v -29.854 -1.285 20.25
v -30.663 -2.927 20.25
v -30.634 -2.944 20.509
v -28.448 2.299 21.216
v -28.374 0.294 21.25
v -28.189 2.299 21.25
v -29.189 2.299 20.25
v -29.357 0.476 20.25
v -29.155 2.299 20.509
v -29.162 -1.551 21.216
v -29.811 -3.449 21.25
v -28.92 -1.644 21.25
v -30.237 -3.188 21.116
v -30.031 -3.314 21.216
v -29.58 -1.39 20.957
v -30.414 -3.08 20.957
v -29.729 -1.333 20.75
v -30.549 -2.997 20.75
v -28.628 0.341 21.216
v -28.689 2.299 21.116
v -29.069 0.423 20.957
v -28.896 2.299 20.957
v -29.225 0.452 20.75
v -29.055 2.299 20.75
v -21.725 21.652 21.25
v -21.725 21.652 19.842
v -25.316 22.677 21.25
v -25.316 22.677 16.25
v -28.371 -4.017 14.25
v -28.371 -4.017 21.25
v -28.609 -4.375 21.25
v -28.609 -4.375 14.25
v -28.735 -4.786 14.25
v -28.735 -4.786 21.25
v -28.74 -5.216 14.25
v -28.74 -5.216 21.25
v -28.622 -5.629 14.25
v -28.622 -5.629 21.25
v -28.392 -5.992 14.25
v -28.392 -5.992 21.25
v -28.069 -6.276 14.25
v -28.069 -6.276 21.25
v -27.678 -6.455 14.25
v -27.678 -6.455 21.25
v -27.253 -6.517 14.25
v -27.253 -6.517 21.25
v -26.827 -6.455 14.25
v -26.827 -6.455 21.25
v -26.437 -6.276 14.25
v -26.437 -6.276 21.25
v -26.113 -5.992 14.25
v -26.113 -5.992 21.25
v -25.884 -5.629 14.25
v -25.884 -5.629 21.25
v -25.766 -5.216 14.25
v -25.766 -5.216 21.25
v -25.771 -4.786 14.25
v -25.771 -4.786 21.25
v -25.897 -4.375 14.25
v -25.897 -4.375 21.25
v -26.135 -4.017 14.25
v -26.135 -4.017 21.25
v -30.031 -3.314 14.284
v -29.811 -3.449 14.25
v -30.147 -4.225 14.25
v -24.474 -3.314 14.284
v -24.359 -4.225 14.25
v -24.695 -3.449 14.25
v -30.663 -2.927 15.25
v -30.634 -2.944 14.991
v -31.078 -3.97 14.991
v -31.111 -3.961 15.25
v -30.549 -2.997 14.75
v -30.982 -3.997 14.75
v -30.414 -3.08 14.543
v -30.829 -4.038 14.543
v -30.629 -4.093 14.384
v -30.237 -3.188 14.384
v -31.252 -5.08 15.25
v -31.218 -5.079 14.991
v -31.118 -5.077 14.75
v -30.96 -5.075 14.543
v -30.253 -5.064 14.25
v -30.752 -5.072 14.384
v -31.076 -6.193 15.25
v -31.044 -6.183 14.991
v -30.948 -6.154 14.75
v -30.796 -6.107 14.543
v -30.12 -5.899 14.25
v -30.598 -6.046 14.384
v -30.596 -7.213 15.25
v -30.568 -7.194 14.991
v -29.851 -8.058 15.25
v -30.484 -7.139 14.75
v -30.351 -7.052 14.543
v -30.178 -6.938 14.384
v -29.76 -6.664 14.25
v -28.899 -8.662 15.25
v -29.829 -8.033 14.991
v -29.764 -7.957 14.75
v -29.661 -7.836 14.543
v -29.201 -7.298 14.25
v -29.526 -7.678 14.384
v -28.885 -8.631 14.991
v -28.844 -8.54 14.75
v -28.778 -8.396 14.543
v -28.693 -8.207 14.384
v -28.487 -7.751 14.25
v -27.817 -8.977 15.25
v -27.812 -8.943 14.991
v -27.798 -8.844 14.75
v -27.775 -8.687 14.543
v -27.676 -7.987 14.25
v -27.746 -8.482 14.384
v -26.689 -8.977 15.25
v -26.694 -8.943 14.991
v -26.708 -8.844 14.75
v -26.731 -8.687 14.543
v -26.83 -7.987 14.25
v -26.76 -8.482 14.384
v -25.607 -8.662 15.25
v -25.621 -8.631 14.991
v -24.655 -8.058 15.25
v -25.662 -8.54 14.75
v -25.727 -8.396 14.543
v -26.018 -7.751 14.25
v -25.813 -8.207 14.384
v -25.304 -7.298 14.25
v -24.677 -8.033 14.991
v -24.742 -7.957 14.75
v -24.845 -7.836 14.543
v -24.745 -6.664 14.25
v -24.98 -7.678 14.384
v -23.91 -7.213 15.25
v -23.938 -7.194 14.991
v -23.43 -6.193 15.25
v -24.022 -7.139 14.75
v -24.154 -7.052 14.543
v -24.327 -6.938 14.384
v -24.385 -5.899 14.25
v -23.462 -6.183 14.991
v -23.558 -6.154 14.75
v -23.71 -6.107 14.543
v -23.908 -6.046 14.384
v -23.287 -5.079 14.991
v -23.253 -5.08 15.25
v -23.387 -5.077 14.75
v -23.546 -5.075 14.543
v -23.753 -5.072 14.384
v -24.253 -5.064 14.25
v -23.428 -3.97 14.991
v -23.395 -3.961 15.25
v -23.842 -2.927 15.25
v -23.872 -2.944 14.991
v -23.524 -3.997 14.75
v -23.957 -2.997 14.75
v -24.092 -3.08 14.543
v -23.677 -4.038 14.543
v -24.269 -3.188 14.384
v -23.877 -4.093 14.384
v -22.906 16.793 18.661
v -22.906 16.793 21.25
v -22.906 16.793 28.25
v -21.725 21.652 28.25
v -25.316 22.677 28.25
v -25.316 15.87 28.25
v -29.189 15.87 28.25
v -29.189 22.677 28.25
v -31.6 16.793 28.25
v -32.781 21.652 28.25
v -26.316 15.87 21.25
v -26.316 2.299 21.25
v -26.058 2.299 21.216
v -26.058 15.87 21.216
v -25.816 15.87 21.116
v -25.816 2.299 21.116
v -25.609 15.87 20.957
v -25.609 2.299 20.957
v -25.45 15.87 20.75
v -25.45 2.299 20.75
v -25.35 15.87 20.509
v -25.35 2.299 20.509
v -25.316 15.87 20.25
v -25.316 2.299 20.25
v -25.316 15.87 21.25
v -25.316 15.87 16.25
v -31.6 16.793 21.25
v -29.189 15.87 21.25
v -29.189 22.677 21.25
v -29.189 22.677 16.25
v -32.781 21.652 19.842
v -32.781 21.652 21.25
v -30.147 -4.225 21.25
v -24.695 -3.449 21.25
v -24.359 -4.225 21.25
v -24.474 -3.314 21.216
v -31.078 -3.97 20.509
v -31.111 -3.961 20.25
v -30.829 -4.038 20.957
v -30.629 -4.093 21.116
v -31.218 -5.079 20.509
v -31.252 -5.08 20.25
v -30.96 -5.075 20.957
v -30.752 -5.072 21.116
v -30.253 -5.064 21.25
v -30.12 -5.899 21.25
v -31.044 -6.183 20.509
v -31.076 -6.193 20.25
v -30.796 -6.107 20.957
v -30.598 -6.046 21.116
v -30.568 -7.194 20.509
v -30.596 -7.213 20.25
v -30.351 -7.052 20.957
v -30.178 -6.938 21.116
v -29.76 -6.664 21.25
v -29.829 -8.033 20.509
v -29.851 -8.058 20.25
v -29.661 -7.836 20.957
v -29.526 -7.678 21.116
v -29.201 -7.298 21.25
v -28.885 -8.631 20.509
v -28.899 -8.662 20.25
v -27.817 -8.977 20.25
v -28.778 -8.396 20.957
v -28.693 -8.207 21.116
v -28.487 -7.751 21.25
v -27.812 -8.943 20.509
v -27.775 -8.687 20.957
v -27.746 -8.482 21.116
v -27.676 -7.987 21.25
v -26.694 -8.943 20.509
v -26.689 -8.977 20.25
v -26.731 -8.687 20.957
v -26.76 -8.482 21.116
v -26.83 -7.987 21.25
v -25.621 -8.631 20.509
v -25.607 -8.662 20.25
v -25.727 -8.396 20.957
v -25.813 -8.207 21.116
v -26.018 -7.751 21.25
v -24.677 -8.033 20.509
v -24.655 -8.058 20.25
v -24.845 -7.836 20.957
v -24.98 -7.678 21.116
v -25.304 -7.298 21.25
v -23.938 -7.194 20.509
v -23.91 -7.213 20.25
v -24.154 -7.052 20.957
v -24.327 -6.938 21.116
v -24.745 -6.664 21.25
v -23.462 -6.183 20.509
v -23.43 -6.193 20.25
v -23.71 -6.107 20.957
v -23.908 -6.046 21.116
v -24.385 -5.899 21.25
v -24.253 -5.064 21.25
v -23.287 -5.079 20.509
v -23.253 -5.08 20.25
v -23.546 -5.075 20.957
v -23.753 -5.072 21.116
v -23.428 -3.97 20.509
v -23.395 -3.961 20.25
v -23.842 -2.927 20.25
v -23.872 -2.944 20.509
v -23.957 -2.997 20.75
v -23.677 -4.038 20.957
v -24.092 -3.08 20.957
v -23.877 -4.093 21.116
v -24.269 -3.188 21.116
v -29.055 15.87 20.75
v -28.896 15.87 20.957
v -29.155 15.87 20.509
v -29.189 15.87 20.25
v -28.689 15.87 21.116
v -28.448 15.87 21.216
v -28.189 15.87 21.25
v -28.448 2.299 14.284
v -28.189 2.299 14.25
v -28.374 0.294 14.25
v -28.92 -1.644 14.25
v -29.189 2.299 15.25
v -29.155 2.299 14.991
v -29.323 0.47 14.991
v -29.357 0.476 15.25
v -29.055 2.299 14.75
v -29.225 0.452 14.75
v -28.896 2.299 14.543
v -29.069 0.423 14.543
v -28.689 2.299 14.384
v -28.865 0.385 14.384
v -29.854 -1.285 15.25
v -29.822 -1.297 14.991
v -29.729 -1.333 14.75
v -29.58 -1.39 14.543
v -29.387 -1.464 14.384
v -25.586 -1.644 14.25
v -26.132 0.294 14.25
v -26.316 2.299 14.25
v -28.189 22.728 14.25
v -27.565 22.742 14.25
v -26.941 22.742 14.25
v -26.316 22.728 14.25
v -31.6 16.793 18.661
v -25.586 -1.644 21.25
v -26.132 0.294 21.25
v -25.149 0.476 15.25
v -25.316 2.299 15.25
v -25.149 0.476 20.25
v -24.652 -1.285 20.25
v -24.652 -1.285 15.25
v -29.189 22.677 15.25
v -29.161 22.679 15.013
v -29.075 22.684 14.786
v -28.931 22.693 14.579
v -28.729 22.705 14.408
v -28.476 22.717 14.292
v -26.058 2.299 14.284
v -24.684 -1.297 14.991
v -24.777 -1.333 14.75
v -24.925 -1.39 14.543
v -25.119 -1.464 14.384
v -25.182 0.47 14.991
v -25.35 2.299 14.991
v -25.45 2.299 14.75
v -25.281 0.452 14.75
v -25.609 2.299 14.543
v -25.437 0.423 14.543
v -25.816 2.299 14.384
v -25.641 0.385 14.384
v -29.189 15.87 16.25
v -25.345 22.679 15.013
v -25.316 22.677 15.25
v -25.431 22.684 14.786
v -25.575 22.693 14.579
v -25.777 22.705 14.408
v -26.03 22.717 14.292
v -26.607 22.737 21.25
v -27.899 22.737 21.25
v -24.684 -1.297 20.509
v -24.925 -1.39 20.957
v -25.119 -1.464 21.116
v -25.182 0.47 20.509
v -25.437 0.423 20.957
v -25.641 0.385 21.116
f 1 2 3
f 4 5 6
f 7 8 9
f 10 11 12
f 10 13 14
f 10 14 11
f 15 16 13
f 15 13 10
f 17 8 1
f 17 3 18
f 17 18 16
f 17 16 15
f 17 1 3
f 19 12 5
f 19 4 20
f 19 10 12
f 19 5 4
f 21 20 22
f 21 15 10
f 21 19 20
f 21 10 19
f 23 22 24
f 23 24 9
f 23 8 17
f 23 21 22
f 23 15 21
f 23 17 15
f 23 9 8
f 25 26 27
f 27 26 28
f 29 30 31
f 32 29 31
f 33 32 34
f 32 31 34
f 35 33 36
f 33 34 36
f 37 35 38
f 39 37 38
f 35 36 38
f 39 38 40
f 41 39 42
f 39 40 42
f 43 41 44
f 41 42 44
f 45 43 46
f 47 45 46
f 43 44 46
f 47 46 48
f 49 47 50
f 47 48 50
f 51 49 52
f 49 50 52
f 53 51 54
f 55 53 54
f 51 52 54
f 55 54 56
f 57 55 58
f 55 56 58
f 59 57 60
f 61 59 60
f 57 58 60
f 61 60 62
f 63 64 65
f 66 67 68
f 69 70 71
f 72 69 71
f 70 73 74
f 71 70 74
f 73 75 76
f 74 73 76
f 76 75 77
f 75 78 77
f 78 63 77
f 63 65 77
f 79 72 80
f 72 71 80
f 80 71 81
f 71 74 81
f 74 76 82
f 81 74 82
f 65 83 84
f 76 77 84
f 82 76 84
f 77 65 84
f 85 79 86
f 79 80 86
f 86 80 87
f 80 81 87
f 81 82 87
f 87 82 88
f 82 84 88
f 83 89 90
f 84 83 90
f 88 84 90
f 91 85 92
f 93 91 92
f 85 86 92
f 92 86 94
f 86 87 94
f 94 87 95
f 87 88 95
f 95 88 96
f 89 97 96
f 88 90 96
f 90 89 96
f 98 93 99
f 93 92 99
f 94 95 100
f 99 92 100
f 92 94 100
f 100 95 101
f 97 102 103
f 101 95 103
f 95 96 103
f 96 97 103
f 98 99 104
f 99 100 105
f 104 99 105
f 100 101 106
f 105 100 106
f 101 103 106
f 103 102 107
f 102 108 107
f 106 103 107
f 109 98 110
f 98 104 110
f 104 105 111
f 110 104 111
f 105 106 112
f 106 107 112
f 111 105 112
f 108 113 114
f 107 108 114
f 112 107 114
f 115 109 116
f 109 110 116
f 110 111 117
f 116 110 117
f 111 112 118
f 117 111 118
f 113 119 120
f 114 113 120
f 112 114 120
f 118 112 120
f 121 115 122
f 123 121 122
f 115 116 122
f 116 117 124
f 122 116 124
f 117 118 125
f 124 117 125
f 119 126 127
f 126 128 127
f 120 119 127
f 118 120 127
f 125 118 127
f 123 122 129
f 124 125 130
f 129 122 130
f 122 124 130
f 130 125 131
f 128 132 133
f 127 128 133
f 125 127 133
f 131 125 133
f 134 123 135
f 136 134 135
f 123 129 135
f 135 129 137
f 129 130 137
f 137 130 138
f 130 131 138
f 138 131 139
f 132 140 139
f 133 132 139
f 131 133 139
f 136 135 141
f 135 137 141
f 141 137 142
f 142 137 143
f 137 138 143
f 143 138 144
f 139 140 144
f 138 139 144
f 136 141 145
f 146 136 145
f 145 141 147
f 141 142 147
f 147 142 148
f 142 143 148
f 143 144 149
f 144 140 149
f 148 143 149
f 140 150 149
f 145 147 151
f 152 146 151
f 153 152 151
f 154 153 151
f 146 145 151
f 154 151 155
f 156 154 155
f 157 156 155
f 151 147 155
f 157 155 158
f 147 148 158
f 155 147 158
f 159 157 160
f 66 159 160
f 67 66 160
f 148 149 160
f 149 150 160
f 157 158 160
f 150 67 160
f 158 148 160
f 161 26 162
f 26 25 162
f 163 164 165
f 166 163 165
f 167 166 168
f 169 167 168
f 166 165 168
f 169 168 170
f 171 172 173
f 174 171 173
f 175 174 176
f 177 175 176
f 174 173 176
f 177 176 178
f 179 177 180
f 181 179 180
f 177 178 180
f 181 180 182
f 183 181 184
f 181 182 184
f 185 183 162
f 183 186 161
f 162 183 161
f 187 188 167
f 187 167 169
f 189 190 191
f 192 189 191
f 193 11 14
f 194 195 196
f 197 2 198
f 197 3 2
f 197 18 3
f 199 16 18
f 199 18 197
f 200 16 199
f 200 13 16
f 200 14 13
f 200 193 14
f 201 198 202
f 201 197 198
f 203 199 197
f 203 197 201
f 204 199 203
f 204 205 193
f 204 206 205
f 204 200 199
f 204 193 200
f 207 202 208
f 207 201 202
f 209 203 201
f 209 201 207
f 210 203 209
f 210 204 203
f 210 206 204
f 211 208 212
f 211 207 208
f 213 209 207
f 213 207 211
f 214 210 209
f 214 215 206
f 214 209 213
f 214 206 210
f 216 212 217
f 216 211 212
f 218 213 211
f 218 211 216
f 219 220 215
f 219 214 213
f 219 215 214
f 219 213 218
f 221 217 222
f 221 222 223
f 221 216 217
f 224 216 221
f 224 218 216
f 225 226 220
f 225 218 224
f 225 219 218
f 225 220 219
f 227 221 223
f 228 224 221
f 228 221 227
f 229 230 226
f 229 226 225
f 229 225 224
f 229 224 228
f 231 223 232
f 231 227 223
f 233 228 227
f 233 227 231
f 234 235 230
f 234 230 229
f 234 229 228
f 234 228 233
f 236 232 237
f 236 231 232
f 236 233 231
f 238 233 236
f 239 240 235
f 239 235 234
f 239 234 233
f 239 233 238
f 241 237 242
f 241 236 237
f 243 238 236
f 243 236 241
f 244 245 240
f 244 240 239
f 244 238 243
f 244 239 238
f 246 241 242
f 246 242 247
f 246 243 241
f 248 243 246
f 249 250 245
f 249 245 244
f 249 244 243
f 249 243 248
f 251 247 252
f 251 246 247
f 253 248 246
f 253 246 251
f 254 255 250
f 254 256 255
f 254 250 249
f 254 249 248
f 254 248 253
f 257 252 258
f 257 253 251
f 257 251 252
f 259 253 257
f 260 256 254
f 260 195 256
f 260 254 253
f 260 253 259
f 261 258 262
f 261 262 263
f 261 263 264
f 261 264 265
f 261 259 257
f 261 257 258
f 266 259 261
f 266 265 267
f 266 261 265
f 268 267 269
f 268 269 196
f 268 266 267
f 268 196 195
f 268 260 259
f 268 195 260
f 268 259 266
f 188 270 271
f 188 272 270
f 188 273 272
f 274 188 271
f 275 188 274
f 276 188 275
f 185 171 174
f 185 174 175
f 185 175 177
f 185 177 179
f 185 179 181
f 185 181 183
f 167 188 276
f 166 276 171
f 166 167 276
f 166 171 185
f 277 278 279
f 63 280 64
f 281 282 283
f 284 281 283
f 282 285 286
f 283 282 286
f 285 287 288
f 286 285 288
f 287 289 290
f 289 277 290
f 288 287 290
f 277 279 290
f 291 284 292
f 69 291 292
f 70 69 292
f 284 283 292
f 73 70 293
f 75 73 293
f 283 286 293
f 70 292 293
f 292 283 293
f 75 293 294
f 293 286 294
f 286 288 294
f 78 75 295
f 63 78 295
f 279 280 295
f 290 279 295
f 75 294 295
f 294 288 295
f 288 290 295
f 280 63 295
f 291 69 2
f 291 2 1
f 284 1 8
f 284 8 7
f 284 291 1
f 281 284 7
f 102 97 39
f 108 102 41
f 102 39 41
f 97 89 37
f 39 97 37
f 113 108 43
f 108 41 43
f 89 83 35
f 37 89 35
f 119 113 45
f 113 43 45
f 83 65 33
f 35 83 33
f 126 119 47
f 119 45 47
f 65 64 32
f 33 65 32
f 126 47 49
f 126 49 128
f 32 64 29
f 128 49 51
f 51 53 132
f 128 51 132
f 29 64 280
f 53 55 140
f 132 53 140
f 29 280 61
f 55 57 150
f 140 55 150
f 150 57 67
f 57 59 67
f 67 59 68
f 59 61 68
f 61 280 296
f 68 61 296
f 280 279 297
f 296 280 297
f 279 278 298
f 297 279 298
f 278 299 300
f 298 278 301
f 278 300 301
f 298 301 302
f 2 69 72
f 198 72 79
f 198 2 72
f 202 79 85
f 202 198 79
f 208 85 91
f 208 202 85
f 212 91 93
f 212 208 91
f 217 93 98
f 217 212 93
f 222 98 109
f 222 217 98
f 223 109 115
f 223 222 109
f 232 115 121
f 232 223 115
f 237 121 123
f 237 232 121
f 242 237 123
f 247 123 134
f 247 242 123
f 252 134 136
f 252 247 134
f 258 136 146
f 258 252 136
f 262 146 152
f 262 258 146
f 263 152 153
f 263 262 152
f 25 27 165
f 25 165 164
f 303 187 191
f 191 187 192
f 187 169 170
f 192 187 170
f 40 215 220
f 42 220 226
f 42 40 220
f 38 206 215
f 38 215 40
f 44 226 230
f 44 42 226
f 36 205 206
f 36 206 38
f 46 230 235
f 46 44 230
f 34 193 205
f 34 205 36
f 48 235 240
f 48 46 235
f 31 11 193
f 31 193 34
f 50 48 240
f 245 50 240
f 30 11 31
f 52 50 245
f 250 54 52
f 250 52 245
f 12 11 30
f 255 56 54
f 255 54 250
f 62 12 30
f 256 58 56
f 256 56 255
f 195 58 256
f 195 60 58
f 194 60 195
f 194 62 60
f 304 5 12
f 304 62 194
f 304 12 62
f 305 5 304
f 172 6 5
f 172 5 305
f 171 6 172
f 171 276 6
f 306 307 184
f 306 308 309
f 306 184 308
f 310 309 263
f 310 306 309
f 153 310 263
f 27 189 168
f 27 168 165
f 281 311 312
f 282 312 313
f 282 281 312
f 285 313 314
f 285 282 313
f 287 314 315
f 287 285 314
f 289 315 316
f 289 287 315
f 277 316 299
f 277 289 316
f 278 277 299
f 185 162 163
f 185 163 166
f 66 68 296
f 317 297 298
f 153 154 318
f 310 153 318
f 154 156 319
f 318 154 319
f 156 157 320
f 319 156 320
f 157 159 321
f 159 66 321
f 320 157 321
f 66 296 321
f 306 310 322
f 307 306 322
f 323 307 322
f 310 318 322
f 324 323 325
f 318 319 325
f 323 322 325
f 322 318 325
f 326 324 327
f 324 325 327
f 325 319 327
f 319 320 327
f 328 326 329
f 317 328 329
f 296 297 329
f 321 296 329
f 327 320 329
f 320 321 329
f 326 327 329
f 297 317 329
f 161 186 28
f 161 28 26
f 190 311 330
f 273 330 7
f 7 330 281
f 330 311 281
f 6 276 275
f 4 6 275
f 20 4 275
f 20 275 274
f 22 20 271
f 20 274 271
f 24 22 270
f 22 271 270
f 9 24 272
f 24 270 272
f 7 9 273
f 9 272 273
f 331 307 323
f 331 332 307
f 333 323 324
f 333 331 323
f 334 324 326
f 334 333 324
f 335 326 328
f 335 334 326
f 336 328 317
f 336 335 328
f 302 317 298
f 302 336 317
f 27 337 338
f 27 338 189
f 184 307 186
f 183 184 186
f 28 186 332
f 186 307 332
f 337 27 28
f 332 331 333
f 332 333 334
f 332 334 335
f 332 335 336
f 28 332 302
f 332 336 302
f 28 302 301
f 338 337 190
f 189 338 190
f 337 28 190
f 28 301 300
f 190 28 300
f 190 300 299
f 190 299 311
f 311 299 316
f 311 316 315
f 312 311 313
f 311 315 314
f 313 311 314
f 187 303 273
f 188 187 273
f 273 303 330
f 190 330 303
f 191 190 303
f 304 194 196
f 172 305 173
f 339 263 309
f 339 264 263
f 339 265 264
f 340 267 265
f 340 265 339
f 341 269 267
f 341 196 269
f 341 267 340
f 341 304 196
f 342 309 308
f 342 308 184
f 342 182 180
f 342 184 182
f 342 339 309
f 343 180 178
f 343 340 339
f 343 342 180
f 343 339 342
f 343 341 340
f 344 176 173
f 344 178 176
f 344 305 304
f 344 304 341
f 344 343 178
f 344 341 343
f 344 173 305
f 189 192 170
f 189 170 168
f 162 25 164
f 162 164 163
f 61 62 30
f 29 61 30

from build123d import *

# Parameters (mm, degrees)
SALIENTE_EXTRUIR1_DEPTH = 7
SALIENTE_EXTRUIR2_DEPTH = 7
SALIENTE_EXTRUIR3_DEPTH = 7
REDONDEO1_R             = 10
REDONDEO2_R             = 1
REDONDEO3_R             = 1
CHAFL_N1_SIZE           = 5


with BuildPart() as part:
    # Croquis1 → Saliente-Extruir1 (new body)
    with BuildSketch(Plane.XY.offset(21.250000099)):
        with BuildLine():
            Line((-25.316388353, -1.516889614), (-29.189371699, -1.516889614))
            ThreePointArc((-29.189371699, -1.516889614), (-27.252880026, -9.016889614), (-25.316388353, -1.516889614))
        make_face()
        with BuildLine():
            Line((-26.134846038, -4.016889614), (-28.370914015, -4.016889614))
            ThreePointArc((-28.370914015, -4.016889614), (-27.252880026, -6.516889614), (-26.134846038, -4.016889614))
        make_face(mode=Mode.SUBTRACT)
    extrude(amount=-SALIENTE_EXTRUIR1_DEPTH)

    # Croquis2 → Saliente-Extruir2 (add)
    with BuildSketch(Plane(origin=(0, 0, 14.250000099), x_dir=(-1, 0, 0), z_dir=(0, 0, -1))):
        with BuildLine():
            Line((25.316388353, -1.516889614), (25.316388353, 22.676611236))
            ThreePointArc((25.316388353, 22.676611236), (27.252880026, 22.744234091), (29.189371699, 22.676611236))
            Line((29.189371699, 22.676611236), (29.189371699, -1.516889614))
            Line((29.189371699, -1.516889614), (25.316388353, -1.516889614))
        make_face()
    extrude(amount=-SALIENTE_EXTRUIR2_DEPTH)

    # Croquis3 → Saliente-Extruir3 (add)
    with BuildSketch(Plane(origin=(0, 0, 21.250000099), x_dir=(-1, 0, 0), z_dir=(0, 0, -1))):
        Polygon((25.316388353, 22.676611236), (21.724816583, 21.651922087), (22.905873651, 16.793413653), (25.316388353, 15.869973518), (29.189371699, 15.869973518), (31.599886401, 16.793413653), (32.780943469, 21.651922087), (29.189371699, 22.676611236), align=None)
    extrude(amount=-SALIENTE_EXTRUIR3_DEPTH)

    # Redondeo1
    redondeo1_edges = [part.edges().sort_by_distance(p)[0] for p in [
        (-29.189371699, -1.516889614, 17.750000099),
        (-25.316388353, -1.516889614, 17.750000099),
    ]]
    fillet(redondeo1_edges, radius=REDONDEO1_R)

    # Redondeo2
    redondeo2_edges = [part.edges().sort_by_distance(p)[0] for p in [
        (-25.316388353, 12.487734734, 14.250000099),
        (-29.189371699, 12.487734734, 14.250000099),
        (-27.252880026, -9.016889614, 14.250000099),
        (-29.564906654, -0.415855859, 14.250000099),
        (-24.940853398, -0.415855859, 14.250000099),
    ]]
    fillet(redondeo2_edges, radius=REDONDEO2_R)

    # Redondeo3
    # the kernel refuses this fillet: 1 mm, written as the material it takes off along each edge
    with BuildSketch(Plane(origin=(-25.316388353, 2.298858232, 21.250000099), x_dir=(-1, 0, 0), z_dir=(0, 1, 0)), Plane(origin=(-29.189371699, 15.869973518, 21.250000099), x_dir=(1, 0, 0), z_dir=(0, -1, 0))) as redondeo3_piece_1:
        with BuildLine():
            CenterArc((REDONDEO3_R, -REDONDEO3_R), REDONDEO3_R, 90, 90)
            Line((0, -REDONDEO3_R), (0, 0))
            Line((0, 0), (REDONDEO3_R, 0))
        make_face()
    extrude(amount=13.571115286, mode=Mode.SUBTRACT)
    with BuildSketch(Plane(origin=(-27.252880026, -5.016889614, 21.250000099), x_dir=(-0.8526065480788361, 0.5225534175307739, 0), z_dir=(0.5225534175307739, 0.8526065480788361, 0))) as redondeo3_piece_2:
        with BuildLine():
            CenterArc((4 - REDONDEO3_R, -REDONDEO3_R), REDONDEO3_R, 0, 90)
            Line((4 - REDONDEO3_R, 0), (4, 0))
            Line((4, 0), (4, -REDONDEO3_R))
        make_face()
    revolve(axis=Axis((-27.252880026, -5.016889614, 21.250000099), (0, 0, 1)), revolution_arc=243.007372153, mode=Mode.SUBTRACT)
    with BuildSketch(Plane(origin=(-39.189371699, 2.298858232, 21.250000099), x_dir=(0.8526065480788363, -0.5225534175307737, 0), z_dir=(-0.5225534175307737, -0.8526065480788363, 0))) as redondeo3_piece_3:
        with BuildLine():
            CenterArc((10 + REDONDEO3_R, -REDONDEO3_R), REDONDEO3_R, 90, 90)
            Line((10 + REDONDEO3_R, 0), (10, 0))
            Line((10, 0), (10, -REDONDEO3_R))
        make_face()
    revolve(axis=Axis((-39.189371699, 2.298858232, 21.250000099), (0, 0, 1)), revolution_arc=31.503686076, mode=Mode.SUBTRACT)
    with BuildSketch(Plane(origin=(-15.316388353, 2.298858232, 21.250000099), x_dir=(-0.8526065480788363, -0.5225534175307737, 0), z_dir=(0.5225534175307737, -0.8526065480788363, 0))) as redondeo3_piece_4:
        with BuildLine():
            CenterArc((10 + REDONDEO3_R, REDONDEO3_R), REDONDEO3_R, 180, 90)
            Line((10, REDONDEO3_R), (10, 0))
            Line((10, 0), (10 + REDONDEO3_R, 0))
        make_face()
    revolve(axis=Axis((-15.316388353, 2.298858232, 21.250000099), (0, 0, -1)), revolution_arc=31.503686076, mode=Mode.SUBTRACT)

    # Chaflán1
    # the kernel refuses this chamfer: 5 mm, written as the material it adds along each edge
    with BuildSketch(Plane(origin=(-25.316388353, 3.011558578, 21.250000099), x_dir=(-0.027495876610586317, 0, -0.9996219169112968), z_dir=(0, 1, 0))) as chafl_n1_piece_1_section:
        Polygon((CHAFL_N1_SIZE * 0.999621916911, -CHAFL_N1_SIZE * 0.0274958766106), (-CHAFL_N1_SIZE * 0.0274958766106, -CHAFL_N1_SIZE * 0.999621916911), (0, 0), align=None)
    chafl_n1_piece_1 = extrude(amount=32.523467598, mode=Mode.PRIVATE)
    chafl_n1_piece_1 = chafl_n1_piece_1 & Plane(origin=(-27.252880026, -5.016889614, 17.716506235), x_dir=(0.06975552192119414, 0.997564116817311, 0), z_dir=(0, 0, -1)) * Cylinder(27.761123704, 86, mode=Mode.PRIVATE)
    chafl_n1_piece_1 = split(chafl_n1_piece_1, bisect_by=Plane(origin=(-25.415963135, 15.831827578, 17.716506235), z_dir=(-0.35773655396653403, 0.9338225516425211, 0)), keep=Keep.TOP, mode=Mode.PRIVATE)
    chafl_n1_piece_1 = split(chafl_n1_piece_1, bisect_by=Plane(origin=(-23.262937497, 15.32456193, 17.716506235), z_dir=(-0.9717016867786622, 0.23621141359278705, 0)), keep=Keep.TOP, mode=Mode.PRIVATE)
    chafl_n1_piece_1 = split(chafl_n1_piece_1, bisect_by=Plane(origin=(-23.613600886, 22.190799465, 17.716506235), z_dir=(-0.2743561835557756, -0.9616281425502842, 0)), keep=Keep.TOP, mode=Mode.PRIVATE)
    add(chafl_n1_piece_1)
    with BuildSketch(Plane(origin=(-29.189371699, 35.535026176, 21.250000099), x_dir=(0.027495876610586317, 0, -0.9996219169112968), z_dir=(0, -1, 0))) as chafl_n1_piece_2_section:
        Polygon((CHAFL_N1_SIZE * 0.999621916911, -CHAFL_N1_SIZE * 0.0274958766106), (-CHAFL_N1_SIZE * 0.0274958766106, -CHAFL_N1_SIZE * 0.999621916911), (0, 0), align=None)
    chafl_n1_piece_2 = extrude(amount=32.523467598, mode=Mode.PRIVATE)
    chafl_n1_piece_2 = chafl_n1_piece_2 & Plane(origin=(-27.252880026, -5.016889614, 19.332721103), x_dir=(0.06975552192119414, 0.997564116817311, 0), z_dir=(0, 0, -1)) * Cylinder(27.761123704, 86, mode=Mode.PRIVATE)
    chafl_n1_piece_2 = split(chafl_n1_piece_2, bisect_by=Plane(origin=(-31.36247481, 16.702464034, 19.332721103), z_dir=(0.35773655396653403, 0.9338225516425211, 0)), keep=Keep.TOP, mode=Mode.PRIVATE)
    chafl_n1_piece_2 = split(chafl_n1_piece_2, bisect_by=Plane(origin=(-31.108304124, 22.129132483, 19.332721103), z_dir=(0.2743561835557751, -0.9616281425502844, 0)), keep=Keep.TOP, mode=Mode.PRIVATE)
    chafl_n1_piece_2 = split(chafl_n1_piece_2, bisect_by=Plane(origin=(-32.12707836, 18.962120521, 19.332721103), z_dir=(0.9717016867786619, 0.2362114135927884, 0)), keep=Keep.TOP, mode=Mode.PRIVATE)
    add(chafl_n1_piece_2)


solid = part.part
